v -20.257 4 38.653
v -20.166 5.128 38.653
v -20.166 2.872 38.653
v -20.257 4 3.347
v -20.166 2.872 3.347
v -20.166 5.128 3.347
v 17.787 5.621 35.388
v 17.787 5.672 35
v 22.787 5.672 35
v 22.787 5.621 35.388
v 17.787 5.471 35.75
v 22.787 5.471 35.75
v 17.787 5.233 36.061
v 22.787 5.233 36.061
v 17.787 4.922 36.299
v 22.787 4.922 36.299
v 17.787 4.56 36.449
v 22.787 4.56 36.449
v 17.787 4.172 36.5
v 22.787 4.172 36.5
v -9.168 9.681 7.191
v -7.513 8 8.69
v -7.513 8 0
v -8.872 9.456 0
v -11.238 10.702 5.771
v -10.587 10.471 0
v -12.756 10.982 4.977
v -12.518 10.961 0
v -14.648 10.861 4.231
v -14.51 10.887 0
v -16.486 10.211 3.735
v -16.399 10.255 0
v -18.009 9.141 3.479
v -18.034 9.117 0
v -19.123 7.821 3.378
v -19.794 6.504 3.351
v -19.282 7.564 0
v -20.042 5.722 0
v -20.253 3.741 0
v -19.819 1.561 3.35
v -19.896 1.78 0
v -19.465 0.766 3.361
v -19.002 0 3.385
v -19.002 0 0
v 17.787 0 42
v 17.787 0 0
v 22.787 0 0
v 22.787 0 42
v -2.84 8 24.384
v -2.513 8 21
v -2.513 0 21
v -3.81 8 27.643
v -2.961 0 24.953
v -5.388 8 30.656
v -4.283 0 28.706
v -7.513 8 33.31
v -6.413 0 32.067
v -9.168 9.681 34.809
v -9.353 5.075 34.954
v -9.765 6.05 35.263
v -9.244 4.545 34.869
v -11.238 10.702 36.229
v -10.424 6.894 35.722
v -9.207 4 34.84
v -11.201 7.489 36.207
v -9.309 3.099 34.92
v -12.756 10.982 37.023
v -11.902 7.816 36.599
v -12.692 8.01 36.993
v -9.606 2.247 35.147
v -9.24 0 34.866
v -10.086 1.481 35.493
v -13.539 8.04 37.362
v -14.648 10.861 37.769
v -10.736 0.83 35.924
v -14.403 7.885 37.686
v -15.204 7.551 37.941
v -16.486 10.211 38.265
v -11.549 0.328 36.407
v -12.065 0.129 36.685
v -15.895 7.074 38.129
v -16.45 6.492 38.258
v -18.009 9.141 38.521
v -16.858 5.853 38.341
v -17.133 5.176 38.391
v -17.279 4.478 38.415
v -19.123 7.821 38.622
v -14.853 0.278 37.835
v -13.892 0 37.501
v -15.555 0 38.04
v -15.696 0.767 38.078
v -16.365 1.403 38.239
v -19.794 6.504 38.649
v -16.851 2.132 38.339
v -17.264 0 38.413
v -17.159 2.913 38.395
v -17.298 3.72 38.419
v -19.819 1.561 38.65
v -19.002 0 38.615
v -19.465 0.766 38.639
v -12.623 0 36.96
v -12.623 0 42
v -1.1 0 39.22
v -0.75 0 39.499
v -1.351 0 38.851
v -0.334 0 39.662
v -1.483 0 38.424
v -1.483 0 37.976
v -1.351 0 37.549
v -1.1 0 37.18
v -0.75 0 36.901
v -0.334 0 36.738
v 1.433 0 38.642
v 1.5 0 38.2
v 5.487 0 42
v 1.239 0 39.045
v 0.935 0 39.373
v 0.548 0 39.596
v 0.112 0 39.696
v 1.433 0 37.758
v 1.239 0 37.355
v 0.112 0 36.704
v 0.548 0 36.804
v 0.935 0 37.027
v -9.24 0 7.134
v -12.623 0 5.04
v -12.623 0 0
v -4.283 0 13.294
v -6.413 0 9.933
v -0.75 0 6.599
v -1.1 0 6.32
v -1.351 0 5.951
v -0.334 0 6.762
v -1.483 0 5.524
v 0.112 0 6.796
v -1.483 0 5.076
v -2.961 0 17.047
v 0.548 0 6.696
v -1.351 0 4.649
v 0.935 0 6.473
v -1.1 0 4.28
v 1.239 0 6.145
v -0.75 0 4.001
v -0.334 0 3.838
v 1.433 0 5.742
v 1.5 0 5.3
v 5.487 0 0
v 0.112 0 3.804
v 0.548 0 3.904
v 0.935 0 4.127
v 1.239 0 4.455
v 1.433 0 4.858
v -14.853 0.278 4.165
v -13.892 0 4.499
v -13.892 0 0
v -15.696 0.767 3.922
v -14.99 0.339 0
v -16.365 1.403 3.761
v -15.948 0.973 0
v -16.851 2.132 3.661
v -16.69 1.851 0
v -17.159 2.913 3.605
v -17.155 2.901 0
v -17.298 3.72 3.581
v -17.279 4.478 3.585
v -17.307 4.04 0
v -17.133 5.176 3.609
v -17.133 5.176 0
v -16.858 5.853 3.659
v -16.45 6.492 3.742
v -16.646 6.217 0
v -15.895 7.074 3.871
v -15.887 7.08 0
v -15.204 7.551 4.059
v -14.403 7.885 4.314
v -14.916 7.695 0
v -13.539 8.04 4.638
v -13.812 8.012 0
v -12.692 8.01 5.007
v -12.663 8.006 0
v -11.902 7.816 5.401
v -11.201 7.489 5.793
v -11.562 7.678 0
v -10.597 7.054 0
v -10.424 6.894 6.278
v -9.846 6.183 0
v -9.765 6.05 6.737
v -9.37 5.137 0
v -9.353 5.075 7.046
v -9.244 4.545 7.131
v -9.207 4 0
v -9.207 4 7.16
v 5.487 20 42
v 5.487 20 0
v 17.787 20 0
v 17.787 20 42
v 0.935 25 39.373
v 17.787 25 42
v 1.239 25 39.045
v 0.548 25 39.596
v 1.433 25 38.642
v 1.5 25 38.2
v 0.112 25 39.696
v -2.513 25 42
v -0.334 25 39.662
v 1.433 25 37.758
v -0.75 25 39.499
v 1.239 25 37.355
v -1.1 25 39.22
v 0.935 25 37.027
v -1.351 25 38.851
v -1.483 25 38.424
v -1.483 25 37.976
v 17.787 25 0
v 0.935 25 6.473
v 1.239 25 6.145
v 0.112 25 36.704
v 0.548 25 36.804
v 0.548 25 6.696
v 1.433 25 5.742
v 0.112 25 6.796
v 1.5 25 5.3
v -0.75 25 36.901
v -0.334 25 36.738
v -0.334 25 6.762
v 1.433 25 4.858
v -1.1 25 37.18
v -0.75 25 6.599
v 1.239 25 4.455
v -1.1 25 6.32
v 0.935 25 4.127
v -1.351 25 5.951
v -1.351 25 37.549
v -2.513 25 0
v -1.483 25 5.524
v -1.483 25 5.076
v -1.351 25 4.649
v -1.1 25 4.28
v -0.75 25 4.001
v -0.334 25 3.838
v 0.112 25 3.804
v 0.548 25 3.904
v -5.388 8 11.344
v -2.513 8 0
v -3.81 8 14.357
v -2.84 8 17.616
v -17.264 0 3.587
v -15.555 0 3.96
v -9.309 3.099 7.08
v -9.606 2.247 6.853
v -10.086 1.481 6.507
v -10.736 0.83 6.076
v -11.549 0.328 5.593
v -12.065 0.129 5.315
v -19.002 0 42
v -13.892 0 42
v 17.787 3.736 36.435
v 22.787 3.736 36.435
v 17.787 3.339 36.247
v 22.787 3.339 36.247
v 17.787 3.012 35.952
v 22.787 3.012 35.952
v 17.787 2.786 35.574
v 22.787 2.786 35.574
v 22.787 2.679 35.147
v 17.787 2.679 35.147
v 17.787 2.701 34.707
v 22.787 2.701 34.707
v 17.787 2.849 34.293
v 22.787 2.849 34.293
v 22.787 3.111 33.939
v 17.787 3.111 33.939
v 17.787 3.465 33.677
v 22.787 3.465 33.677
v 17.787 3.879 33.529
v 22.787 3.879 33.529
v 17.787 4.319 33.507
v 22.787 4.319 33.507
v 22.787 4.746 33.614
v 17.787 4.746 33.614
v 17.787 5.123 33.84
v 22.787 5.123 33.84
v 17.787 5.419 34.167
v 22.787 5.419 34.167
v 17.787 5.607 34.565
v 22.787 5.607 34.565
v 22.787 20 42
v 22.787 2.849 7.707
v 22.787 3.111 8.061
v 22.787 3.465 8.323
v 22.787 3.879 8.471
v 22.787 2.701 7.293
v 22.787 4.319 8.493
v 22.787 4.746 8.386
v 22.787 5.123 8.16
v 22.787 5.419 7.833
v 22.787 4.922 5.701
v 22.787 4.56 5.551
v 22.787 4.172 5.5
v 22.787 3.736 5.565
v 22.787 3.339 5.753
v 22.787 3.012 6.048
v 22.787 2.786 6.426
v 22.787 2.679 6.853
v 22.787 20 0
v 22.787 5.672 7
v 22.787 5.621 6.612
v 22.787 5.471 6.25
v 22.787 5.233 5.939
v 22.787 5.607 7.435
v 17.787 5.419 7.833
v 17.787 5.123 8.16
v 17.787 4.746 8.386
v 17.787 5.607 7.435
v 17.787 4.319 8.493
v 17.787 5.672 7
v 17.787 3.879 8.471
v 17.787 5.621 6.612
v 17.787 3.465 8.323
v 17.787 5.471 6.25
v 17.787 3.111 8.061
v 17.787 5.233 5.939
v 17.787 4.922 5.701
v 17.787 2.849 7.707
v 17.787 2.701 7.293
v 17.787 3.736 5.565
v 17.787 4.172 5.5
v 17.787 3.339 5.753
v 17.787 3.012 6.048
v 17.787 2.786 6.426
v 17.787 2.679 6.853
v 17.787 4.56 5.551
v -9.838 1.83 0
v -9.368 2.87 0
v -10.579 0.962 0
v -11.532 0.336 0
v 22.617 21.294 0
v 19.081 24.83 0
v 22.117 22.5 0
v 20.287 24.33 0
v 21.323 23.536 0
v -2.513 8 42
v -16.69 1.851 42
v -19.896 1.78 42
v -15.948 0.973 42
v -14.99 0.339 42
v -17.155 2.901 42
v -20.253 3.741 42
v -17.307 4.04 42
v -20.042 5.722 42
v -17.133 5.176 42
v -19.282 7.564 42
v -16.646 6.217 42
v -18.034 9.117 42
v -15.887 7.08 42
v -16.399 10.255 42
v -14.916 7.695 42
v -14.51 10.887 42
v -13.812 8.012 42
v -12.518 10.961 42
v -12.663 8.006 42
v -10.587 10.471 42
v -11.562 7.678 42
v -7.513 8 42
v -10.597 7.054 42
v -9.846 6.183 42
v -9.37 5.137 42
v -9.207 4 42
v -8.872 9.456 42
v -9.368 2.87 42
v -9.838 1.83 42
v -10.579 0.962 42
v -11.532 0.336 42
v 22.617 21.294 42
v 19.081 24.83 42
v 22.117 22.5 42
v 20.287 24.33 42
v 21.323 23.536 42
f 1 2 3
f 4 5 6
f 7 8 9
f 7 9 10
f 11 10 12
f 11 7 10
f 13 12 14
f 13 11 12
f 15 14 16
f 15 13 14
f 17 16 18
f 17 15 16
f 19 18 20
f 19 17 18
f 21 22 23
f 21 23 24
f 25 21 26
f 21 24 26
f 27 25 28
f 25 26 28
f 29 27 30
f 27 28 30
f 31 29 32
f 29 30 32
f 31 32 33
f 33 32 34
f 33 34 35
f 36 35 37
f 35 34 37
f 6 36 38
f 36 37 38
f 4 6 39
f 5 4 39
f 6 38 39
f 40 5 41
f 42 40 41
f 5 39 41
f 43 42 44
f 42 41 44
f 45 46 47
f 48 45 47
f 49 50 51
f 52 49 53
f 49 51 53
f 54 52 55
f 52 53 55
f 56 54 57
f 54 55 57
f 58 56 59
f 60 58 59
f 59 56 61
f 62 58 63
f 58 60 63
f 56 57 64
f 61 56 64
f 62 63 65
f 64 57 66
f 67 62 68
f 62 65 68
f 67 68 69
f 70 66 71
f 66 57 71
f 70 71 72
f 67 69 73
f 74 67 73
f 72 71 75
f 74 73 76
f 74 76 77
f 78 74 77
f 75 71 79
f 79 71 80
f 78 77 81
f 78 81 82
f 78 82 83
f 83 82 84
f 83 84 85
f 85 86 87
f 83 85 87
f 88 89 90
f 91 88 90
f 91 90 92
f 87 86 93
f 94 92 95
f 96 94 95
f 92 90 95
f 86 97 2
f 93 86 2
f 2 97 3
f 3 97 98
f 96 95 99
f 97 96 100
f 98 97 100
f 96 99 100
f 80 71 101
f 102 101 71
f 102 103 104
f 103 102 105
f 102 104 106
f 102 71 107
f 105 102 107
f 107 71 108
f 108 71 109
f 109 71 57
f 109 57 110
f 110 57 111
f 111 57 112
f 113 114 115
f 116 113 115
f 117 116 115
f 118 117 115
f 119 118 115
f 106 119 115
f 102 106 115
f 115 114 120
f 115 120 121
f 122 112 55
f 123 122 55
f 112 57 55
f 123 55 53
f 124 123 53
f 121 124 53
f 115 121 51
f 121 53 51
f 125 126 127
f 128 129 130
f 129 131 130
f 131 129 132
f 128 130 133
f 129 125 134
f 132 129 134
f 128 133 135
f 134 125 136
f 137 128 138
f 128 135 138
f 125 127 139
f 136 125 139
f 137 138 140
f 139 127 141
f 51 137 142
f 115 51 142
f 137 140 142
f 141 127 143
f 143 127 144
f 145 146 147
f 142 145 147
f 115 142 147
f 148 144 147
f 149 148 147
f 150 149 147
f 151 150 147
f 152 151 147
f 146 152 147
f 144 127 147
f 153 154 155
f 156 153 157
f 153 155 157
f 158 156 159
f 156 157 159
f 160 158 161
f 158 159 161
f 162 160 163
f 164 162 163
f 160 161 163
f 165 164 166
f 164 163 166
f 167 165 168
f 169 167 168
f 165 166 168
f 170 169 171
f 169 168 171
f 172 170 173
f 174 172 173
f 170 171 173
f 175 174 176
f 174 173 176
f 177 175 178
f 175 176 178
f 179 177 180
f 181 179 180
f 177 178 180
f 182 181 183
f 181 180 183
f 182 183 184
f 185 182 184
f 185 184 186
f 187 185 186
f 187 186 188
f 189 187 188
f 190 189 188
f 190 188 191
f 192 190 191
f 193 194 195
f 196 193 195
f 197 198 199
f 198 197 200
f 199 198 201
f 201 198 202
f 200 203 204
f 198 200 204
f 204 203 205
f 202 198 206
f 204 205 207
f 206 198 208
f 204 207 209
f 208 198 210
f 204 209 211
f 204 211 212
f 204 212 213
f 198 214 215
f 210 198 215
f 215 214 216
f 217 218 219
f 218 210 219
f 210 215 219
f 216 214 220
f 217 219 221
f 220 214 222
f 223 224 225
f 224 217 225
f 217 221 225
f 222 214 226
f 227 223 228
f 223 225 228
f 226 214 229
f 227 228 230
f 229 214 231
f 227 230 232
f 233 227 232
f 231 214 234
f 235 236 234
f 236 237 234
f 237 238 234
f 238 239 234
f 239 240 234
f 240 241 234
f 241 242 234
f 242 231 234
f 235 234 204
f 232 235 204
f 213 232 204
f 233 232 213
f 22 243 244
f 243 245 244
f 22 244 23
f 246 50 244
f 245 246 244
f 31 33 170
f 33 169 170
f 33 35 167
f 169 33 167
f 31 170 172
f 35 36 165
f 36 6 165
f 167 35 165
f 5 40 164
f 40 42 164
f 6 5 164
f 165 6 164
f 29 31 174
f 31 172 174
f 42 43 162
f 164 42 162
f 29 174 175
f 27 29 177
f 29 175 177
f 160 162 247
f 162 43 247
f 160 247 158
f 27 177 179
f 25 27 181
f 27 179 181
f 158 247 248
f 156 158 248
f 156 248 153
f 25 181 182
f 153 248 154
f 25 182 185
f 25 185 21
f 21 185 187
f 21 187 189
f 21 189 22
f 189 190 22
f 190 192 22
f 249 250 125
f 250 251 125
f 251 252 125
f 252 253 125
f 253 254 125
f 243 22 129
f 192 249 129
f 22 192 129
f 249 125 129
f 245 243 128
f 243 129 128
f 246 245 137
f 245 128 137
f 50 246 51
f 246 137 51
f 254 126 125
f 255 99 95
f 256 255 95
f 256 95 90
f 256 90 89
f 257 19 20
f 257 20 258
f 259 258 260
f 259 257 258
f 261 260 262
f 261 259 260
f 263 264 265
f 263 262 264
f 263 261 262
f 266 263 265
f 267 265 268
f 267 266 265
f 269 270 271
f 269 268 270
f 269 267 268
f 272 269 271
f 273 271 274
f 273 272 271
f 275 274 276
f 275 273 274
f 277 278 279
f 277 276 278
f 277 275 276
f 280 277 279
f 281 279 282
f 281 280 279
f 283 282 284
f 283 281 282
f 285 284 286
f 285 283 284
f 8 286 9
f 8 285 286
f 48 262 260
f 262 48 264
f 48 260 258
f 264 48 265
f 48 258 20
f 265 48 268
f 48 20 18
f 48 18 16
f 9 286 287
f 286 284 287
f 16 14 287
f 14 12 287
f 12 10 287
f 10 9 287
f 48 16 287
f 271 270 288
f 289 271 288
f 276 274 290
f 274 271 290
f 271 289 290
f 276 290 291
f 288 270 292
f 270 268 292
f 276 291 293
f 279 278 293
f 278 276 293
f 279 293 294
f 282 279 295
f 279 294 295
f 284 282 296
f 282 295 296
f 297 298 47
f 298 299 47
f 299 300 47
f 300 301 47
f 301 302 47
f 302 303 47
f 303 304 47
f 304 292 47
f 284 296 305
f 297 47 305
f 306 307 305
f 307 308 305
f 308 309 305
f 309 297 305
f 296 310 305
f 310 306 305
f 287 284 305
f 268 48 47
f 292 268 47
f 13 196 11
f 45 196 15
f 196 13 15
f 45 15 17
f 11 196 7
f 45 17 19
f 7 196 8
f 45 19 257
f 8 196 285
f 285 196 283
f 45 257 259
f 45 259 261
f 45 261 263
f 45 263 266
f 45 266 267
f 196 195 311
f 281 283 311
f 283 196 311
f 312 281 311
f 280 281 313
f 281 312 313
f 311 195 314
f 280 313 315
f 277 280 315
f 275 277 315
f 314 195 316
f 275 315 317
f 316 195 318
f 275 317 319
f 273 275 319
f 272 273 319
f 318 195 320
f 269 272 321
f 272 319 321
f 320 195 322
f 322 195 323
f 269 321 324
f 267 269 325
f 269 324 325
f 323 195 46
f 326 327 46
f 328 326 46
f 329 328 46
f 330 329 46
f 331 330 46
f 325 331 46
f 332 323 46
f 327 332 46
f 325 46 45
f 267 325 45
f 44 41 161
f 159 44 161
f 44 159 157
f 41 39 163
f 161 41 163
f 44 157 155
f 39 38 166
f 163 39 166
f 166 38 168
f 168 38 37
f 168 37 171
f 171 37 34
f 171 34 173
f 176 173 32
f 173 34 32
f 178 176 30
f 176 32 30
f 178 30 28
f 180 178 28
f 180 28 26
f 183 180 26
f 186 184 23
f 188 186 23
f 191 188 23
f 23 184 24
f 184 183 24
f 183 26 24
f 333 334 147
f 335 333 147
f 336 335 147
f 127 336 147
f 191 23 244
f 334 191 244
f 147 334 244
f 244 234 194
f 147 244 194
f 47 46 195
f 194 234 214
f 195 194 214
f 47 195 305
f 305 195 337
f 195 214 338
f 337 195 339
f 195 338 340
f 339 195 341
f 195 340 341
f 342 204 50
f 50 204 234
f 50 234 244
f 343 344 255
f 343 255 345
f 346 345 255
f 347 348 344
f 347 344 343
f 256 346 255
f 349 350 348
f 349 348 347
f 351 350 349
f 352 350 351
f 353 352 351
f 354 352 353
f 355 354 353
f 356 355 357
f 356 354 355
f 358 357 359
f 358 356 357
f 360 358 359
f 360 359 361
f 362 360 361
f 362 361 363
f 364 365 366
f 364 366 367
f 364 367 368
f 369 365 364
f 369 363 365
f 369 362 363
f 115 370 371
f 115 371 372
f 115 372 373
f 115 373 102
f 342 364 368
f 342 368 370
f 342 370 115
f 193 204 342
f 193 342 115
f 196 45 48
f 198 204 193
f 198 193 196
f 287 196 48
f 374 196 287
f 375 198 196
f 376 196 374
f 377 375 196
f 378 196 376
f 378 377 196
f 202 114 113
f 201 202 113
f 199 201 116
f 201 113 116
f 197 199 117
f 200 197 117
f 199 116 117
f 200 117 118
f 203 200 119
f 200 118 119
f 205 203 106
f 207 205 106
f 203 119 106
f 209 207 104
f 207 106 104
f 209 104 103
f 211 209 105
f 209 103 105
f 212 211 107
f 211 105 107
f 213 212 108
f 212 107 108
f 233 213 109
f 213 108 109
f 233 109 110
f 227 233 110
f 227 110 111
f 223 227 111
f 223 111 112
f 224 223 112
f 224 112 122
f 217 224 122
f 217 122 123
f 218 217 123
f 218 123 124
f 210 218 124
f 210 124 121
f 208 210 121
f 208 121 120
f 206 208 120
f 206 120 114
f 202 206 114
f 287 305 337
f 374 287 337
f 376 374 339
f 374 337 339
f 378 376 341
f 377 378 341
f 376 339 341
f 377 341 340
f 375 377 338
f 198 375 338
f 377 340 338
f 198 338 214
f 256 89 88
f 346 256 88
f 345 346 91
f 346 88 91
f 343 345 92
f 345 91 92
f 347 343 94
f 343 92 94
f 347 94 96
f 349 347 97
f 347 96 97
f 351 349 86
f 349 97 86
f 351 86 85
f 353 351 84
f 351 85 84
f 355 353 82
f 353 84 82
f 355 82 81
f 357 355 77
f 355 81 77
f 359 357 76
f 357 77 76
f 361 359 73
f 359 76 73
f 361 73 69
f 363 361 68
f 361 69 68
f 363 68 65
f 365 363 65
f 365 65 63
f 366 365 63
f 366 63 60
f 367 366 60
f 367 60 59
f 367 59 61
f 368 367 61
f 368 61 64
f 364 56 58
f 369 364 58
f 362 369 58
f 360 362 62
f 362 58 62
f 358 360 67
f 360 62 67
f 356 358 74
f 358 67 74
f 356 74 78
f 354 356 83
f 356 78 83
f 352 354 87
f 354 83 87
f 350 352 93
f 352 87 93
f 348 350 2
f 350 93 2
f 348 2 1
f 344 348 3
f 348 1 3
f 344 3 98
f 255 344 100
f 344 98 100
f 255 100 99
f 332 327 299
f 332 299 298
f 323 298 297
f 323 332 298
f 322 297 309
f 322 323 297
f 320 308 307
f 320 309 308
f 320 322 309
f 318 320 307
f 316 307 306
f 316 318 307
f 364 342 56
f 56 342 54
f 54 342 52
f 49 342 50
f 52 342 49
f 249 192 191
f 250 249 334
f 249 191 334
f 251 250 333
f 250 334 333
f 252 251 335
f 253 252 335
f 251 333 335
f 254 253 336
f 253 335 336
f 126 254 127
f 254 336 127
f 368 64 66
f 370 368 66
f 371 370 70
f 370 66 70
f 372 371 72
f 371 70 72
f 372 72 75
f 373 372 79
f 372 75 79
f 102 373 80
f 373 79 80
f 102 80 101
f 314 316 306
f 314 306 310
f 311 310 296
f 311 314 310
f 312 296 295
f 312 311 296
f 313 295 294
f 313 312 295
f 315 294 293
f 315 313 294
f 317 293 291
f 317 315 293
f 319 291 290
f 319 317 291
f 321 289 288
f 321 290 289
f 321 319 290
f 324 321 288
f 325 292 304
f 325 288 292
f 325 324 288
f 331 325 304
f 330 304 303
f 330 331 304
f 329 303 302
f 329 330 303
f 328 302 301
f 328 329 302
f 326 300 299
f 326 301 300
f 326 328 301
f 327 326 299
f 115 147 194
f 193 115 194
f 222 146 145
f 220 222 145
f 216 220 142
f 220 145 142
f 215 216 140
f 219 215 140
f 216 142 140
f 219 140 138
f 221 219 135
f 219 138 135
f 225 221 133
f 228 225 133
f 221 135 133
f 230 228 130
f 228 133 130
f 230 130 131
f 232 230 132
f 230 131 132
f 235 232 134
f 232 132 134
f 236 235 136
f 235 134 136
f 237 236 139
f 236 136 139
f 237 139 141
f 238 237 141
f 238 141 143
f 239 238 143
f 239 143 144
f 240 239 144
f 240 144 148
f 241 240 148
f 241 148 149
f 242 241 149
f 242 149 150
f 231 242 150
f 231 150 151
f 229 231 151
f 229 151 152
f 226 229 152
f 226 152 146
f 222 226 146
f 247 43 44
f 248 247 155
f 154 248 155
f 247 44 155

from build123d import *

# Parameters (mm, degrees)
F1_DEPTH      = 42
F2_R          = 1.5
F3_DEPTH      = 25.001
F3_DEPTH_BACK = 90
F6_DEPTH      = 25


# Not quite as in the source:
# - an extrude ends at something that could not be found from the text; its depth is read off the source's solid


with BuildPart() as f1:
    # F0 (on Top) → F1 (new body)
    with BuildSketch(Plane.XY):
        with BuildLine():
            Line((-12.622932768, 0), (-7.5127989985, 0))
            Line((-7.5127989985, 0), (-7.5127989985, 8))
            ThreePointArc((-7.5127989985, 8), (-17.257361645, 9.7445626465), (-19.0019242916, 0))
            Line((-19.0019242916, 0), (-13.8917905221, 0))
            ThreePointArc((-13.8917905221, 0), (-15.8872915916, 7.0799299466), (-9.207361645, 4))
            ThreePointArc((-9.207361645, 4), (-10.1774316984, 1.3700700534), (-12.622932768, 0))
        make_face()
        with BuildLine():
            ThreePointArc((-6.257361645, 4), (-6.5785916039, 1.9038056538), (-7.5127989985, 0))
            Line((-7.5127989985, 0), (-2.5127989985, 0))
            Line((-2.5127989985, 0), (-2.5127989985, 8))
            Line((-2.5127989985, 8), (-7.5127989985, 8))
            ThreePointArc((-7.5127989985, 8), (-6.5785916039, 6.0961943462), (-6.257361645, 4))
        make_face()
        with BuildLine():
            Line((-7.5127989985, 8), (-7.5127989985, 0))
            ThreePointArc((-7.5127989985, 0), (-6.5785916039, 1.9038056538), (-6.257361645, 4))
            ThreePointArc((-6.257361645, 4), (-6.5785916039, 6.0961943462), (-7.5127989985, 8))
        make_face()
        with BuildLine():
            Line((-2.5127989985, 8), (-2.5127989985, 0))
            Line((-2.5127989985, 0), (5.4872010015, 0))
            Line((5.4872010015, 0), (5.4872010015, 20))
            Line((5.4872010015, 20), (17.7872010015, 20))
            Line((17.7872010015, 20), (17.7872010015, 0))
            Line((17.7872010015, 0), (22.7872010015, 0))
            Line((22.7872010015, 0), (22.7872010015, 20))
            ThreePointArc((22.7872010015, 20), (21.3227349074, 23.5355339059), (17.7872010015, 25))
            Line((17.7872010015, 25), (-2.5127989985, 25))
            Line((-2.5127989985, 25), (-2.5127989985, 8))
        make_face()
    extrude(amount=F1_DEPTH)

    # F2 (on Front) → F3 (cut, two sides)
    with BuildSketch(Plane.XZ) as f3_sk:
        with BuildLine():
            Line((-20.1659295708, 21), (-20.1659295708, 38.6531305723))
            ThreePointArc((-20.1659295708, 38.6531305723), (-37.8190601431, 21), (-20.1659295708, 3.3468694277))
            Line((-20.1659295708, 3.3468694277), (-20.1659295708, 21))
        make_face()
        with BuildLine():
            ThreePointArc((-20.1659295708, 3.3468694277), (-7.683281234, 8.5173516632), (-2.5127989985, 21))
            Line((-2.5127989985, 21), (-20.1659295708, 21))
            Line((-20.1659295708, 21), (-20.1659295708, 3.3468694277))
        make_face()
        with Locations((0, 38.2)):
            Circle(F2_R)
        with Locations((0, 5.3)):
            Circle(F2_R)
        with BuildLine():
            Line((-20.1659295708, 21), (-2.5127989985, 21))
            ThreePointArc((-2.5127989985, 21), (-7.683281234, 33.4826483368), (-20.1659295708, 38.6531305723))
            Line((-20.1659295708, 38.6531305723), (-20.1659295708, 21))
        make_face()
    extrude(amount=-F3_DEPTH, mode=Mode.SUBTRACT)
    extrude(f3_sk.sketch, amount=F3_DEPTH_BACK, mode=Mode.SUBTRACT)

    # F5 (on offset) → F6 (cut)
    with BuildSketch(Plane.YZ.offset(10)):
        with BuildLine():
            ThreePointArc((4.1718953289, 5.5), (5.2325555007, 5.9393398282), (5.6718953289, 7))
            ThreePointArc((5.6718953289, 7), (3.1112351571, 8.0606601718), (4.1718953289, 5.5))
        make_face()
        with BuildLine():
            ThreePointArc((4.1718953289, 36.5), (3.1112351571, 33.9393398282), (5.6718953289, 35))
            ThreePointArc((5.6718953289, 35), (5.2325555007, 36.0606601718), (4.1718953289, 36.5))
        make_face()
    extrude(amount=F6_DEPTH, mode=Mode.SUBTRACT)


solid = f1.part
